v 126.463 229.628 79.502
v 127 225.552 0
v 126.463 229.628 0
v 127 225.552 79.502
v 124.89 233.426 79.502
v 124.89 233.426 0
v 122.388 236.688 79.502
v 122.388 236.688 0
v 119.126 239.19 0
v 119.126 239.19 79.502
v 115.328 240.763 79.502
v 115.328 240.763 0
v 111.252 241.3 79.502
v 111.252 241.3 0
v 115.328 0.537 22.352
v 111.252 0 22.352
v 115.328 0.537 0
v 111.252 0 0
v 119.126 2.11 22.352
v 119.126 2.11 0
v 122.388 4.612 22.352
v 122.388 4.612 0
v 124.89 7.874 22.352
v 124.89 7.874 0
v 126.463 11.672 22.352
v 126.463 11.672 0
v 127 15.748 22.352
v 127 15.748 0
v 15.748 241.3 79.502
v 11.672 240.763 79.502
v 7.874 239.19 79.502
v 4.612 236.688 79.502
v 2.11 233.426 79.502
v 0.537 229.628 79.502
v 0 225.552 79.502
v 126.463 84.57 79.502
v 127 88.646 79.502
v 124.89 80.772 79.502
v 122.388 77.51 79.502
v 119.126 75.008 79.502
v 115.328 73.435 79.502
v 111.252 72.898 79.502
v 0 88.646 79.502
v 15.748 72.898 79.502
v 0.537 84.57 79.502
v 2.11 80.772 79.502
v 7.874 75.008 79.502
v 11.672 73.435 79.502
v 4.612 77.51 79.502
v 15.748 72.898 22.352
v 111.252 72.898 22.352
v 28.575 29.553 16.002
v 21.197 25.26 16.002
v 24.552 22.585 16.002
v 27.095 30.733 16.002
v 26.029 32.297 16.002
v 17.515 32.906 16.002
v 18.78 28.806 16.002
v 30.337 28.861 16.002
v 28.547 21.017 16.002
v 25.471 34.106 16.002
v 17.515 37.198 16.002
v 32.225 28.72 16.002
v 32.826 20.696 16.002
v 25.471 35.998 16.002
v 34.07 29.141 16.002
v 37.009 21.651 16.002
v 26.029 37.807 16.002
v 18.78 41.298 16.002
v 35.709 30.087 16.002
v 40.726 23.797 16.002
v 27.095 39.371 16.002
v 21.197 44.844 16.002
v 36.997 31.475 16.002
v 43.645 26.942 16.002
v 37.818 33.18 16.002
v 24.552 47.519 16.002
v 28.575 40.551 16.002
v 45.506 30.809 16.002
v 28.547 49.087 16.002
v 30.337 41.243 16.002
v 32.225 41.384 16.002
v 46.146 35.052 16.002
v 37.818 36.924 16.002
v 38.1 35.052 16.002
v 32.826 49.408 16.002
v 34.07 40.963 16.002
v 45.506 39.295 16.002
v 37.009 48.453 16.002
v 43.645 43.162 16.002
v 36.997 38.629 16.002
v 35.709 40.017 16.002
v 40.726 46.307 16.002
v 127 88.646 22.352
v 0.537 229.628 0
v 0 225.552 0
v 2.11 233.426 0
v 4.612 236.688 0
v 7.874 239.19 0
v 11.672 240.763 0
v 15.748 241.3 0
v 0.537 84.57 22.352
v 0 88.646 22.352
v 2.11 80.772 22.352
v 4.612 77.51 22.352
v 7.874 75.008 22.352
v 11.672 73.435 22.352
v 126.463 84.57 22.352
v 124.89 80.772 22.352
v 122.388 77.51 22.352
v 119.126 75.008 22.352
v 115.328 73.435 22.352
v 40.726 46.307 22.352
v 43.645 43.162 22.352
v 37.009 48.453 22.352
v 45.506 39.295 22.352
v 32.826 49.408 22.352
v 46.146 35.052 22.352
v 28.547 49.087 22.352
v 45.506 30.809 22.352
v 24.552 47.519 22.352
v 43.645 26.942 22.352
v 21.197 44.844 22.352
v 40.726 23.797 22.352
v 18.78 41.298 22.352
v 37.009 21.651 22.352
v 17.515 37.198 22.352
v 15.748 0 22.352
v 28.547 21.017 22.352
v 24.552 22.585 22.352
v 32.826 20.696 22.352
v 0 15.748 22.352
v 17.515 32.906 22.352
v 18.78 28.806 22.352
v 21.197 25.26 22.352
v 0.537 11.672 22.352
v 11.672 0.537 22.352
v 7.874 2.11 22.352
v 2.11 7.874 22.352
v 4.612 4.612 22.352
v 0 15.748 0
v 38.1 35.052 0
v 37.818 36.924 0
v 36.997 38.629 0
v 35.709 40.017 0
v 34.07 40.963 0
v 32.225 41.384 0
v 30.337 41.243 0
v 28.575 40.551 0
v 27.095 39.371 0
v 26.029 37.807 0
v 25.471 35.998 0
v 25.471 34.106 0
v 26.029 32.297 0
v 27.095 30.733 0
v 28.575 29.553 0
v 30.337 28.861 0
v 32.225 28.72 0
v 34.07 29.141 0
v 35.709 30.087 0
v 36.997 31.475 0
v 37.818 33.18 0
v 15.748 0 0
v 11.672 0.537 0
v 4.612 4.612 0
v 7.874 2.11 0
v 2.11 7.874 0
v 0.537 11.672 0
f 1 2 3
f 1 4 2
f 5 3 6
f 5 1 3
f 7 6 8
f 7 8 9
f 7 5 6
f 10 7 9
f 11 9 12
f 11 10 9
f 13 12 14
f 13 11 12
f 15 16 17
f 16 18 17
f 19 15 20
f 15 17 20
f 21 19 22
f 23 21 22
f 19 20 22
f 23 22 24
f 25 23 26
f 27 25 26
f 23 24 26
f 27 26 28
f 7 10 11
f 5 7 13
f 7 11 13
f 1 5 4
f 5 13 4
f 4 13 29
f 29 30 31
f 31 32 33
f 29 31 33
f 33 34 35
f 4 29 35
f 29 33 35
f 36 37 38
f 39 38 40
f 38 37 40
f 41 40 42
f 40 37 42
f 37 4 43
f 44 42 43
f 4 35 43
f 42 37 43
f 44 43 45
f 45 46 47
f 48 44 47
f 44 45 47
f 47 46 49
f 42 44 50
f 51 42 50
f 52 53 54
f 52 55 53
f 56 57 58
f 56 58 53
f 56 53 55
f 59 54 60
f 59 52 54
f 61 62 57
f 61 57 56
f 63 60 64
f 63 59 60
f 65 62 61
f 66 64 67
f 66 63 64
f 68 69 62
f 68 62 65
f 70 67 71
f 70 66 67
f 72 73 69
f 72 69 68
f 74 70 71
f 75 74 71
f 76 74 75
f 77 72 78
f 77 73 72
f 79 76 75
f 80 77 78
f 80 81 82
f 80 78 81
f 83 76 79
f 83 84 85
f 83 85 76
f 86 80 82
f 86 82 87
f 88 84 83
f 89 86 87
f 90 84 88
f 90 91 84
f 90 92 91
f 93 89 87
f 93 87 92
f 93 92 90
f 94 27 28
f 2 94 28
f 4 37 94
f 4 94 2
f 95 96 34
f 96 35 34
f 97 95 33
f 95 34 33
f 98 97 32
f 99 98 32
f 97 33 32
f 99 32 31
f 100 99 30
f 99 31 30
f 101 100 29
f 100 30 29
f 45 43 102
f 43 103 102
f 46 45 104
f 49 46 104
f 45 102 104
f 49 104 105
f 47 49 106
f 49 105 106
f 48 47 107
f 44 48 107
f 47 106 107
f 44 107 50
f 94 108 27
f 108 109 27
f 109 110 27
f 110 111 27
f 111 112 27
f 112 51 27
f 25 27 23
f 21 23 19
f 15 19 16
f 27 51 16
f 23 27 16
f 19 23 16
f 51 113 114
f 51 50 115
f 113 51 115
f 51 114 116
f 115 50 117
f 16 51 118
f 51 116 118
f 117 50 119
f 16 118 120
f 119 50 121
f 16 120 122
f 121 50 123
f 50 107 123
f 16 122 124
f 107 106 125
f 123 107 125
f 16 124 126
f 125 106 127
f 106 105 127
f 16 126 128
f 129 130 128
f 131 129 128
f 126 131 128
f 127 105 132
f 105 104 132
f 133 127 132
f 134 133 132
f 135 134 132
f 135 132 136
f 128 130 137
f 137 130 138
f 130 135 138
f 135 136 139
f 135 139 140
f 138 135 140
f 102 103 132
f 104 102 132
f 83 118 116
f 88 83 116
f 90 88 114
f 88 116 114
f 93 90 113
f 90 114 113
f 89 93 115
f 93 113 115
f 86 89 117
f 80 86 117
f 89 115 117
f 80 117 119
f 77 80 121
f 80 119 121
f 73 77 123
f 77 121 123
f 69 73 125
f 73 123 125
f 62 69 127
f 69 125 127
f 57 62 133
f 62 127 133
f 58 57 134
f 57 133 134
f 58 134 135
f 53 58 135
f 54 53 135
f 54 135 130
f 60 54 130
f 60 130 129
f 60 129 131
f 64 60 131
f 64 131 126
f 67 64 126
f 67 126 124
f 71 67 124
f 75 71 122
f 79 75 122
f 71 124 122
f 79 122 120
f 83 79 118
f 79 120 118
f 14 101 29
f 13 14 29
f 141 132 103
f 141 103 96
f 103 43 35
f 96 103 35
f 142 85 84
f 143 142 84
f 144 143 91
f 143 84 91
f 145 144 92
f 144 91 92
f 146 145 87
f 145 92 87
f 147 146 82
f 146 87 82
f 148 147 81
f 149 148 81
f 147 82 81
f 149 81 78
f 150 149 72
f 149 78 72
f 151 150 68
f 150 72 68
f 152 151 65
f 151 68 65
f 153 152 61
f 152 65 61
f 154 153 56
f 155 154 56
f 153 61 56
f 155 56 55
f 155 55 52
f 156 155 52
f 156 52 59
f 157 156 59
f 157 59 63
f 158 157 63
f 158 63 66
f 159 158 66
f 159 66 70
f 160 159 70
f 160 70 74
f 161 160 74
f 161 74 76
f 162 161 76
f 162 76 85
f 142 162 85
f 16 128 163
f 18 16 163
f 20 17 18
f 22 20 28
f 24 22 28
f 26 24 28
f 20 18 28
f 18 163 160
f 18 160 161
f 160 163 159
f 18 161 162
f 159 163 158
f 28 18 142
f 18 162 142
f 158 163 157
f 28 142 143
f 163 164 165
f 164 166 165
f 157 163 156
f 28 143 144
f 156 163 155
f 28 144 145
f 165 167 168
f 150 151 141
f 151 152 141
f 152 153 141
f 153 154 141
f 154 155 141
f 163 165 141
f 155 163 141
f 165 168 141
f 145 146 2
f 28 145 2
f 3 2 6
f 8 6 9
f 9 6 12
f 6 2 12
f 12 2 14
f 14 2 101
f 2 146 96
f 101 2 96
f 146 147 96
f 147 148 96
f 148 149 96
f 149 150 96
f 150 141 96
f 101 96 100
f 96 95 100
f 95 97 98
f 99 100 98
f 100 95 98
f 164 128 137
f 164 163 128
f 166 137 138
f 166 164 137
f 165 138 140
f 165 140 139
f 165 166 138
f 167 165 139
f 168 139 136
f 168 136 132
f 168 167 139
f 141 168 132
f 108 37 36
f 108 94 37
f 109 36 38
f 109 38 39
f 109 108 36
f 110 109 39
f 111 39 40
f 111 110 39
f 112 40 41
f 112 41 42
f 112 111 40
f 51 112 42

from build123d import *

# Parameters (mm, degrees)
F1_DEPTH = 127
F3_R     = 6.35
F4_DEPTH = 22.353
F2_R     = 14.396011
F5_DEPTH = 6.35
F6_R     = 15.748


with BuildPart() as f1:
    # F0 (on Right) → F1 (new body)
    with BuildSketch(Plane.YZ):
        Polygon((0, 22.352), (0, 0), (241.3, 0), (241.3, 79.502), (72.898, 79.502), (72.898, 22.352), align=None)
    extrude(amount=F1_DEPTH)

    # F3 (on face) → F4 (cut, through all)
    with BuildSketch(Plane.XY.offset(22.352)):
        with Locations((31.75, 35.052)):
            Circle(F3_R)
    extrude(amount=-F4_DEPTH, mode=Mode.SUBTRACT)

    # F2 (on face) → F5 (cut)
    with BuildSketch(Plane.XY.offset(22.352)):
        with Locations((31.75, 35.052)):
            Circle(F2_R)
    extrude(amount=-F5_DEPTH, mode=Mode.SUBTRACT)

    # F6
    f6_edges = [f1.edges().sort_by_distance(p)[0] for p in [
        (127, 72.898, 50.927),
        (127, 0, 11.176),
        (0, 0, 11.176),
        (0, 72.898, 50.927),
        (0, 241.3, 39.751),
        (127, 241.3, 39.751),
    ]]
    fillet(f6_edges, radius=F6_R)


solid = f1.part
